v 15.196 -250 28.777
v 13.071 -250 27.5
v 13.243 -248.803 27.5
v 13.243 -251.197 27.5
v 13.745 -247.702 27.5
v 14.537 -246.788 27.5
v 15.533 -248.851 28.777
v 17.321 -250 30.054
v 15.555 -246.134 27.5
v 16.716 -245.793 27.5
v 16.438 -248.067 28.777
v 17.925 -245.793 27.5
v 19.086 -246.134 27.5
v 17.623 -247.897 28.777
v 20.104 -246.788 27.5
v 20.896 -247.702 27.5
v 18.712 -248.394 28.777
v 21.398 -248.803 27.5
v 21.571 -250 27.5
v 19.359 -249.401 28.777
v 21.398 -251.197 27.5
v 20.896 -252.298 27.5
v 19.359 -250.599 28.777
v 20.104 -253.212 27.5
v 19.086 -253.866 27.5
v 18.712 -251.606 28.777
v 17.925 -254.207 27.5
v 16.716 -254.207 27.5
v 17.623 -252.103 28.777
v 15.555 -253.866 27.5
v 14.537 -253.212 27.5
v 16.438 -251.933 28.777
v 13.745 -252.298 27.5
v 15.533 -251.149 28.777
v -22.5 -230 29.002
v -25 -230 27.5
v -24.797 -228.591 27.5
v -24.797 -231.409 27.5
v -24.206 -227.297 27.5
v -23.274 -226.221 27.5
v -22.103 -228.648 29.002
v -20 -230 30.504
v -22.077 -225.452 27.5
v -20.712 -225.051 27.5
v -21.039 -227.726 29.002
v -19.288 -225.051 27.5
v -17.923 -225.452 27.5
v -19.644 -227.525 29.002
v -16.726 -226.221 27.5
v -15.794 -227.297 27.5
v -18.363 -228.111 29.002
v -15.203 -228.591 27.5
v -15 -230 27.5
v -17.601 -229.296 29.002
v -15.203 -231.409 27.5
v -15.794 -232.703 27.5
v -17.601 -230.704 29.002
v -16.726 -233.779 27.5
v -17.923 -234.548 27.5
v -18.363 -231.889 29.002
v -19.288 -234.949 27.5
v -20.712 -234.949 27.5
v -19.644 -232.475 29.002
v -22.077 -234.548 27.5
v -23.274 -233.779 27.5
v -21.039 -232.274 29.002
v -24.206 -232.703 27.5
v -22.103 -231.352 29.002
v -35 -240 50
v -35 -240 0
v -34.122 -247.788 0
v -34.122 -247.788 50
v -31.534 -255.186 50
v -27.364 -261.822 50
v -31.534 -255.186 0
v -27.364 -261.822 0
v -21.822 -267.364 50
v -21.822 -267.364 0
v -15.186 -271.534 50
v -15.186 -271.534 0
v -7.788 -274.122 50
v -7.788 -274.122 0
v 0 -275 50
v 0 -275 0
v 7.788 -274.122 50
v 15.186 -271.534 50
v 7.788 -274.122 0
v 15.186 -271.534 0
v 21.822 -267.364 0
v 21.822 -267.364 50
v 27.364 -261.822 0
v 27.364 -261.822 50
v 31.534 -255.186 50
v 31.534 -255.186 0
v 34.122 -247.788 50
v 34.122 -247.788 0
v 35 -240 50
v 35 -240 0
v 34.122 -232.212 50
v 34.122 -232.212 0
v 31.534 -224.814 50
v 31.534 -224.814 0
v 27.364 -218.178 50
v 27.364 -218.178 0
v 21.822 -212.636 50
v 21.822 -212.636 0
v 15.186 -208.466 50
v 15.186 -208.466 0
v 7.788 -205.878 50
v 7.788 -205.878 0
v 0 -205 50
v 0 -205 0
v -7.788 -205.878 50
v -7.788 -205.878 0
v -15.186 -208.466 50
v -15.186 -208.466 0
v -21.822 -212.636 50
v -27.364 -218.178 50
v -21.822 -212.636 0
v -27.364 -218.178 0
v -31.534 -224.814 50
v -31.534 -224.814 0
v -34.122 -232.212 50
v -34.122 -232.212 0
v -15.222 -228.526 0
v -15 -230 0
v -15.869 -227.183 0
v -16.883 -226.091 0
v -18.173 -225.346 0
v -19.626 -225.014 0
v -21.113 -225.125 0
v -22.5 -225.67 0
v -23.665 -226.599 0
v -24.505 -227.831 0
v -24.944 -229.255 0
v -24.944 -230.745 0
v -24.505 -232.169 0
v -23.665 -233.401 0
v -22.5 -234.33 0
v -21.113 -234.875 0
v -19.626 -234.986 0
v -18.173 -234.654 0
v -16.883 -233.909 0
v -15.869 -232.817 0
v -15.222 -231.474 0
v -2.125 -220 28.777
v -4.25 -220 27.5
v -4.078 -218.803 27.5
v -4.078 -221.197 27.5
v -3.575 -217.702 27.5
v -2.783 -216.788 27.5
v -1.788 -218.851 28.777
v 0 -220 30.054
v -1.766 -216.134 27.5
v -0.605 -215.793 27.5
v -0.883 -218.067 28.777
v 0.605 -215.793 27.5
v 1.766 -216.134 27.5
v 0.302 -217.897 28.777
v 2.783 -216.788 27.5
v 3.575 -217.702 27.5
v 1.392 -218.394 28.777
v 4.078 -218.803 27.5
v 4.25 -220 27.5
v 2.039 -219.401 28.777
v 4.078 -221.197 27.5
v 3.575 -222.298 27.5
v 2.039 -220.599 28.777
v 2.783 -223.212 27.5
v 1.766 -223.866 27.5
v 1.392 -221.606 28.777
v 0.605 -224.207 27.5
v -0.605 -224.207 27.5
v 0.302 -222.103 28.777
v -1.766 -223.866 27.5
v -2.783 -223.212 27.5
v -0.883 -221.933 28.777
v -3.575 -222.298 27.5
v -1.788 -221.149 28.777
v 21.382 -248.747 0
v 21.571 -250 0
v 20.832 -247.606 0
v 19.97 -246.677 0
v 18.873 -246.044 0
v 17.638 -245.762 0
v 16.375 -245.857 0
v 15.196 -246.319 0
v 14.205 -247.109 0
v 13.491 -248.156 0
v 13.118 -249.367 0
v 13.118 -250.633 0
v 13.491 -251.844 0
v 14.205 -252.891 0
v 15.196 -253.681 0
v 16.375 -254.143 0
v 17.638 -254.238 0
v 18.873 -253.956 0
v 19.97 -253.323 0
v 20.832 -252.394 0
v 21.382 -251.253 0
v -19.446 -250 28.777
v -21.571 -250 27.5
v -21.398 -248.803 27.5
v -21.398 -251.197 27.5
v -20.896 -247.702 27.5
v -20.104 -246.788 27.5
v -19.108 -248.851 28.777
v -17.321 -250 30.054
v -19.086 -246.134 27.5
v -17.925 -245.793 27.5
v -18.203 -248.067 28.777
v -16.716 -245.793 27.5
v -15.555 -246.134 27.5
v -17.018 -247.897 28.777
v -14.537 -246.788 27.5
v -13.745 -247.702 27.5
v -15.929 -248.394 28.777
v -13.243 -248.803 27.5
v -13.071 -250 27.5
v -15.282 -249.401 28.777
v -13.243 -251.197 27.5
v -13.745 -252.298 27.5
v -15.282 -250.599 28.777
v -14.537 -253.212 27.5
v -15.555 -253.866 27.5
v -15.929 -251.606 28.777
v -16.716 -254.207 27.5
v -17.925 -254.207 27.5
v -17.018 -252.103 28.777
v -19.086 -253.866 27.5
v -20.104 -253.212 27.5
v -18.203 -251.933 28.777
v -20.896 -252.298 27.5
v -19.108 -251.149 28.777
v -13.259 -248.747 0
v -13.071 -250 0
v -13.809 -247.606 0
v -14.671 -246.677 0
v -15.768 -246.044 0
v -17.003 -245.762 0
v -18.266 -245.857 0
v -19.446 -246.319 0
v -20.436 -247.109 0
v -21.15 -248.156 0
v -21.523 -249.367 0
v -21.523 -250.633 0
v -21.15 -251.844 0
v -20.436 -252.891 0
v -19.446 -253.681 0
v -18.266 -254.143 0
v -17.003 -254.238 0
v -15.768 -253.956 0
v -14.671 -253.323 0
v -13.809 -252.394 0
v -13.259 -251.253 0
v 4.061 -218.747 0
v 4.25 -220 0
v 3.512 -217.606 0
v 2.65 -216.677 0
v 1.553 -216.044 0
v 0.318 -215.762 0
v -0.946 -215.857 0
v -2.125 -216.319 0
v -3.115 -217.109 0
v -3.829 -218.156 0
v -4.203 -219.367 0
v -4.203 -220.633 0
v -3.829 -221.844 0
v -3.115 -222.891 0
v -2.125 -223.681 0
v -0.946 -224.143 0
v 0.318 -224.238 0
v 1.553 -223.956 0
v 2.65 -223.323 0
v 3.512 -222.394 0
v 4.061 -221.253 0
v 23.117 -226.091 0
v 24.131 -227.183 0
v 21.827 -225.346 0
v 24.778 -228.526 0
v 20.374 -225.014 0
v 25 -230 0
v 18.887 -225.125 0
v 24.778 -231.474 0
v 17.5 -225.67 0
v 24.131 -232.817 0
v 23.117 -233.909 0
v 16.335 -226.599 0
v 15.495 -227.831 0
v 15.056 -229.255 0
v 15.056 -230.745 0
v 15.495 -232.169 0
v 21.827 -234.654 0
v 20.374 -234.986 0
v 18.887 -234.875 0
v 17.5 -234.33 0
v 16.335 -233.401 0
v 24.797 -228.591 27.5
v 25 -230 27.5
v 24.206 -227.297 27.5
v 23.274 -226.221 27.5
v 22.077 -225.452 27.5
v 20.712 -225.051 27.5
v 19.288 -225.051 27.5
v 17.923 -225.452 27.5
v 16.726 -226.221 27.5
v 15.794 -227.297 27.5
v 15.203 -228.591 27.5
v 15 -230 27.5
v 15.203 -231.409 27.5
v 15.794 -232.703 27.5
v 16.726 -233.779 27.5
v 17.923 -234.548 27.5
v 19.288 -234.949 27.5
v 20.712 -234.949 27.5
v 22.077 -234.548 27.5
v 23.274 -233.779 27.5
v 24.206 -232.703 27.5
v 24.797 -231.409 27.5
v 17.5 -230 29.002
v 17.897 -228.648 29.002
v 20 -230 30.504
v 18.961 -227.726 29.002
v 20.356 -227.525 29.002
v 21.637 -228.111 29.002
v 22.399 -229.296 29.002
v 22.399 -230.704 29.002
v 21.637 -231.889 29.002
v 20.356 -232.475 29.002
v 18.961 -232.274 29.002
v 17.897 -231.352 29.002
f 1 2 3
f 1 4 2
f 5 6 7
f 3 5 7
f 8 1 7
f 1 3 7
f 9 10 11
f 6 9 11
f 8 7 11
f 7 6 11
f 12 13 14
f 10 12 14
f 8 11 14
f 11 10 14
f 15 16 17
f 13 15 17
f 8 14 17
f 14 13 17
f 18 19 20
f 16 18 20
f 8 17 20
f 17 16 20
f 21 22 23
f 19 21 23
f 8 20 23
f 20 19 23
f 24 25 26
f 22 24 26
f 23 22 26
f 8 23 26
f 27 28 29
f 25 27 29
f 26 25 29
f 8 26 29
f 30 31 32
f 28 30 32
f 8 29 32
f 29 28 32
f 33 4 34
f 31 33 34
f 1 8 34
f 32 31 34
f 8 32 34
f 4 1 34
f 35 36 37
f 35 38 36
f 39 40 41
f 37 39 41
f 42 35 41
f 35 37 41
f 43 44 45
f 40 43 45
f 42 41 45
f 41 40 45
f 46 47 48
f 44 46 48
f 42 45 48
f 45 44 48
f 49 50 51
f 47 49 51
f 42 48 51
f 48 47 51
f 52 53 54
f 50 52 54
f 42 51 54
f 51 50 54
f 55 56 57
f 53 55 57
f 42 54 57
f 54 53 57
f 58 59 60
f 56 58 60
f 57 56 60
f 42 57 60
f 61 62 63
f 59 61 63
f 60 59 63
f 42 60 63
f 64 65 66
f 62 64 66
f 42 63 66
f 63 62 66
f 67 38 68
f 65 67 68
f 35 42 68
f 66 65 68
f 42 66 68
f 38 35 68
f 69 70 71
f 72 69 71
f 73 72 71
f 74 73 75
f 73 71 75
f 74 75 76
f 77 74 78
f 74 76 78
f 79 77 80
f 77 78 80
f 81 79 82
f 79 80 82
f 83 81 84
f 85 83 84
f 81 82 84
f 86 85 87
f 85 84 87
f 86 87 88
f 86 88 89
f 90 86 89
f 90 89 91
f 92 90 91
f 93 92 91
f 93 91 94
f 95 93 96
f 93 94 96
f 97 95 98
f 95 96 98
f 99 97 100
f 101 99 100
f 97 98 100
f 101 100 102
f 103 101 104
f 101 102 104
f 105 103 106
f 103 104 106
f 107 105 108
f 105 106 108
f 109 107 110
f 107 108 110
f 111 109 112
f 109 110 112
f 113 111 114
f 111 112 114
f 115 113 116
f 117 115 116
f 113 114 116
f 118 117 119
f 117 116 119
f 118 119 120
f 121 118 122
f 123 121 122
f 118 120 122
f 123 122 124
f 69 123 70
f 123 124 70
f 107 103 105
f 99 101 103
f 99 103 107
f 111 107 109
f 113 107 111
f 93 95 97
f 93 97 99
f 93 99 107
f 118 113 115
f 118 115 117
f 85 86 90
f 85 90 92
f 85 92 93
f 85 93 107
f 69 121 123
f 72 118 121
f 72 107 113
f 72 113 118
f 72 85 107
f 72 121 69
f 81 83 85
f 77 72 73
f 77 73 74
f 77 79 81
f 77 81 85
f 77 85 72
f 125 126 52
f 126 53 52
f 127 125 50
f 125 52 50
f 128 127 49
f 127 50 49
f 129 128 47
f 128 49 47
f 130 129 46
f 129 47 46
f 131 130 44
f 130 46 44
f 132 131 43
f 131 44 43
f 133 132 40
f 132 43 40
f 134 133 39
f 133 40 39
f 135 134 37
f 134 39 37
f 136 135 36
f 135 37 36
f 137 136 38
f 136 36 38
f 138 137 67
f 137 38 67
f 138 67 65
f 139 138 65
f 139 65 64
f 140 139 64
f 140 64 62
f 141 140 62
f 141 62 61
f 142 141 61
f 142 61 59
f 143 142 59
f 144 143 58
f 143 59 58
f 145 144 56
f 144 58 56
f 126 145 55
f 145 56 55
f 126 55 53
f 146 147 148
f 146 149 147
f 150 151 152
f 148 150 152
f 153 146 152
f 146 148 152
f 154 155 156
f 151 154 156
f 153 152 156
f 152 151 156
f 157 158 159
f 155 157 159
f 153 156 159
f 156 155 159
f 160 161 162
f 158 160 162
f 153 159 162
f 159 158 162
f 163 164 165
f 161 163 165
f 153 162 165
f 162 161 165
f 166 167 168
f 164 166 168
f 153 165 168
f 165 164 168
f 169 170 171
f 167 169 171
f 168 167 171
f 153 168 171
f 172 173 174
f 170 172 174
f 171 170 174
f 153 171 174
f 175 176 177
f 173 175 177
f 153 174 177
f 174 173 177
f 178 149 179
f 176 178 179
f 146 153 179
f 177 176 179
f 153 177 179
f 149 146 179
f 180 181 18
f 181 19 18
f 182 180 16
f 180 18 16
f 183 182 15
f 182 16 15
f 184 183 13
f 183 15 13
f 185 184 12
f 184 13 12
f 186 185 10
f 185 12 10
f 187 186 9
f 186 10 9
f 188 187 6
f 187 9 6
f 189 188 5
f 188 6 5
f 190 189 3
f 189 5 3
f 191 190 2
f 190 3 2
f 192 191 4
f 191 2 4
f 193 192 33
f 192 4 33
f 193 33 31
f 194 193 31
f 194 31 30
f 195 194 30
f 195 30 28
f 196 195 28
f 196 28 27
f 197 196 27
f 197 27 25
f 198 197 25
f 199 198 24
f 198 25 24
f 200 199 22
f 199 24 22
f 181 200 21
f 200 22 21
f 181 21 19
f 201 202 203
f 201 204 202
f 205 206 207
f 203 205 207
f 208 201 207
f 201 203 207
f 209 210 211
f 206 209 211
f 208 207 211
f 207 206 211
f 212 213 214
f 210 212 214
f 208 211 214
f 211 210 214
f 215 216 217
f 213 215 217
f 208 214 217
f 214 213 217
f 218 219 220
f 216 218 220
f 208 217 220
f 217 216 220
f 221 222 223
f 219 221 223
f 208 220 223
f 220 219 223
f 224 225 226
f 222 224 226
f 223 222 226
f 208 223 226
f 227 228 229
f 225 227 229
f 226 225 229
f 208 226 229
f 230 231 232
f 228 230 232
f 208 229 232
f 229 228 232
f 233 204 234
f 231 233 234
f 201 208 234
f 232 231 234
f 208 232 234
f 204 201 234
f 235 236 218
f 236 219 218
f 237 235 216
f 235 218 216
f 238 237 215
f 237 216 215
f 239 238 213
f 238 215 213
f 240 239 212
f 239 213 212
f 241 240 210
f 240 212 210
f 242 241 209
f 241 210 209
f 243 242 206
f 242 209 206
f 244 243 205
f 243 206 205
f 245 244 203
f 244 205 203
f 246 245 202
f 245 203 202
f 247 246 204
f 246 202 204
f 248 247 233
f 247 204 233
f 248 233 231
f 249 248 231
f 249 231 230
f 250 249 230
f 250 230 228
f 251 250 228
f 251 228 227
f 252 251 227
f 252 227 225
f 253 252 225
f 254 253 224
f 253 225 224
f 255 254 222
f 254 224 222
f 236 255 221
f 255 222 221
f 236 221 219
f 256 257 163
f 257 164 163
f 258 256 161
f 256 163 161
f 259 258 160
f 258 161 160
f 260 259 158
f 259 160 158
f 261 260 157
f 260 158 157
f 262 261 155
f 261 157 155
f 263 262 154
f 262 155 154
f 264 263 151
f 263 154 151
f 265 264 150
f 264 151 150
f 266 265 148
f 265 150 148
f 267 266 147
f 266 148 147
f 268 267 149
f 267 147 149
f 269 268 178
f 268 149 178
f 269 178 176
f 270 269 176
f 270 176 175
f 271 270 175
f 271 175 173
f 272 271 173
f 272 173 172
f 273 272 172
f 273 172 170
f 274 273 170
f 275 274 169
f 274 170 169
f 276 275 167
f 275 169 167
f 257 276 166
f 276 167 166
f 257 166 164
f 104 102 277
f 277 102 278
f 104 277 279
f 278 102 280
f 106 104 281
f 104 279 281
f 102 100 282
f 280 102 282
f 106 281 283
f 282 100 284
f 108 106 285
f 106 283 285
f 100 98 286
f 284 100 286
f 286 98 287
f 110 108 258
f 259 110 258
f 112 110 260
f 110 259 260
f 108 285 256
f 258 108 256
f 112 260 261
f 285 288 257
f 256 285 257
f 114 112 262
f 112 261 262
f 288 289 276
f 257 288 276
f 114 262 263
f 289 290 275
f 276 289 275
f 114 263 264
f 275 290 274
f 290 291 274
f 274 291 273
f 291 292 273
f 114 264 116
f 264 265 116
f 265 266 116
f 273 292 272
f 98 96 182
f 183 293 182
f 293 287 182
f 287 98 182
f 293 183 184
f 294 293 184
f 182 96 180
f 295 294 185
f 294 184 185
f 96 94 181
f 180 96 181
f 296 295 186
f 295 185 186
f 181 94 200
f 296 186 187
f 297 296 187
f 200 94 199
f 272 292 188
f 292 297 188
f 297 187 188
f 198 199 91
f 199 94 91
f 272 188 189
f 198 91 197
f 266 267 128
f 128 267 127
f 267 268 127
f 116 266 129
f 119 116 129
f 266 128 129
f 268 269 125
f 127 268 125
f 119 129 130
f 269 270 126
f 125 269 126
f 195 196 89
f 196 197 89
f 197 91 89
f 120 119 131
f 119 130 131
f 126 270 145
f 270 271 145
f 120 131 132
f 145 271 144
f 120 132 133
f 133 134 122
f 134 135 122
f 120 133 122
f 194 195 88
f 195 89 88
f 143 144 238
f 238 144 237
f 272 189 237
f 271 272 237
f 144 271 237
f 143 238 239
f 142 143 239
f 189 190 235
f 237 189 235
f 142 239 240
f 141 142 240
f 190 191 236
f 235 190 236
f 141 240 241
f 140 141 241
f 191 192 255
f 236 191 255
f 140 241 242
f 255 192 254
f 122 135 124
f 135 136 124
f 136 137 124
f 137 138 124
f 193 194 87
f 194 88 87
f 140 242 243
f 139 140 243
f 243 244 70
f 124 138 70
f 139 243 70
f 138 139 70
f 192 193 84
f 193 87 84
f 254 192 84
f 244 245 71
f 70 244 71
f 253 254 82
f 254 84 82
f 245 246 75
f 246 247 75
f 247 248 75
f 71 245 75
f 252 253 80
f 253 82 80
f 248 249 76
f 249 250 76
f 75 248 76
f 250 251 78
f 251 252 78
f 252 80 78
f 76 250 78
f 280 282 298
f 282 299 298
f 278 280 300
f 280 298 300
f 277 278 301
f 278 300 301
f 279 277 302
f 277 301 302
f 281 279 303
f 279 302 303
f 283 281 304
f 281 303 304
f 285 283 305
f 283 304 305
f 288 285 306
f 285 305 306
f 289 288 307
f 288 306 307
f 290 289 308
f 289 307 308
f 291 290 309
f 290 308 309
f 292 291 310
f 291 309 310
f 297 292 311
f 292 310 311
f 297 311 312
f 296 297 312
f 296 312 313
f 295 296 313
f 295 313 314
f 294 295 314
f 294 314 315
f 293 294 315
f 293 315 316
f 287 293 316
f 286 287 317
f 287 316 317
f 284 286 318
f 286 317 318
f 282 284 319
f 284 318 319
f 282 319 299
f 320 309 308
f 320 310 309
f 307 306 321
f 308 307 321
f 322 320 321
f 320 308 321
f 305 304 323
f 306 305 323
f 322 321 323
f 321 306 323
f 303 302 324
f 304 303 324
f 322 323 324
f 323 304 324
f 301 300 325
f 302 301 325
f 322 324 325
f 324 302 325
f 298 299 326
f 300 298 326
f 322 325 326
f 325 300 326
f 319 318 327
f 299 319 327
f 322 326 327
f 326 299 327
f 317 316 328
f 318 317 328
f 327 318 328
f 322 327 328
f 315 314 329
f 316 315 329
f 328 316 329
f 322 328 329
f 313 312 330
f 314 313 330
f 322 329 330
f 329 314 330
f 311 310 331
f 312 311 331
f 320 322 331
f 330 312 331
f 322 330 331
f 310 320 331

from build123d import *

# Parameters (mm, degrees)
ESBO_O1_R                    = 35
RESSALTO_EXTRUS_O1_DEPTH     = 50
FURO_ROSCADO_DE_M101_D       = 8.5
FURO_ROSCADO_DE_M101_DEPTH   = 27.5
FURO_ROSCADO_DE_M101_TIP     = 2.553657631
FUROS_GUIA_COM_10_0MM1_D     = 10
FUROS_GUIA_COM_10_0MM1_DEPTH = 27.5
FUROS_GUIA_COM_10_0MM1_TIP   = 3.004303095


with BuildPart() as part:
    # Esboço1 → Ressalto-extrusão1 (new body)
    with BuildSketch(Plane.XY):
        with Locations(Location((0, -240, 0), (0, 0, 180))):
            Circle(ESBO_O1_R)
    extrude(amount=RESSALTO_EXTRUS_O1_DEPTH)

    # Furo roscado de M101
    with Locations(Plane(origin=(0, 0, 0), x_dir=(-1, 0, 0), z_dir=(0, 0, -1))):
        with Locations((0, -220), (17.320508076, -250), (-17.320508076, -250)):
            Hole(FURO_ROSCADO_DE_M101_D / 2, depth=FURO_ROSCADO_DE_M101_DEPTH)
            with Locations((0, 0, -(FURO_ROSCADO_DE_M101_DEPTH + FURO_ROSCADO_DE_M101_TIP / 2))):  # 118° drill point
                Cone(0, FURO_ROSCADO_DE_M101_D / 2, FURO_ROSCADO_DE_M101_TIP, mode=Mode.SUBTRACT)

    # Furos-guia com Ø10.0mm1
    with Locations(Plane(origin=(0, 0, 0), x_dir=(-1, 0, 0), z_dir=(0, 0, -1))):
        with Locations((20, -230), (-20, -230)):
            Hole(FUROS_GUIA_COM_10_0MM1_D / 2, depth=FUROS_GUIA_COM_10_0MM1_DEPTH)
            with Locations((0, 0, -(FUROS_GUIA_COM_10_0MM1_DEPTH + FUROS_GUIA_COM_10_0MM1_TIP / 2))):  # 118° drill point
                Cone(0, FUROS_GUIA_COM_10_0MM1_D / 2, FUROS_GUIA_COM_10_0MM1_TIP, mode=Mode.SUBTRACT)


solid = part.part
